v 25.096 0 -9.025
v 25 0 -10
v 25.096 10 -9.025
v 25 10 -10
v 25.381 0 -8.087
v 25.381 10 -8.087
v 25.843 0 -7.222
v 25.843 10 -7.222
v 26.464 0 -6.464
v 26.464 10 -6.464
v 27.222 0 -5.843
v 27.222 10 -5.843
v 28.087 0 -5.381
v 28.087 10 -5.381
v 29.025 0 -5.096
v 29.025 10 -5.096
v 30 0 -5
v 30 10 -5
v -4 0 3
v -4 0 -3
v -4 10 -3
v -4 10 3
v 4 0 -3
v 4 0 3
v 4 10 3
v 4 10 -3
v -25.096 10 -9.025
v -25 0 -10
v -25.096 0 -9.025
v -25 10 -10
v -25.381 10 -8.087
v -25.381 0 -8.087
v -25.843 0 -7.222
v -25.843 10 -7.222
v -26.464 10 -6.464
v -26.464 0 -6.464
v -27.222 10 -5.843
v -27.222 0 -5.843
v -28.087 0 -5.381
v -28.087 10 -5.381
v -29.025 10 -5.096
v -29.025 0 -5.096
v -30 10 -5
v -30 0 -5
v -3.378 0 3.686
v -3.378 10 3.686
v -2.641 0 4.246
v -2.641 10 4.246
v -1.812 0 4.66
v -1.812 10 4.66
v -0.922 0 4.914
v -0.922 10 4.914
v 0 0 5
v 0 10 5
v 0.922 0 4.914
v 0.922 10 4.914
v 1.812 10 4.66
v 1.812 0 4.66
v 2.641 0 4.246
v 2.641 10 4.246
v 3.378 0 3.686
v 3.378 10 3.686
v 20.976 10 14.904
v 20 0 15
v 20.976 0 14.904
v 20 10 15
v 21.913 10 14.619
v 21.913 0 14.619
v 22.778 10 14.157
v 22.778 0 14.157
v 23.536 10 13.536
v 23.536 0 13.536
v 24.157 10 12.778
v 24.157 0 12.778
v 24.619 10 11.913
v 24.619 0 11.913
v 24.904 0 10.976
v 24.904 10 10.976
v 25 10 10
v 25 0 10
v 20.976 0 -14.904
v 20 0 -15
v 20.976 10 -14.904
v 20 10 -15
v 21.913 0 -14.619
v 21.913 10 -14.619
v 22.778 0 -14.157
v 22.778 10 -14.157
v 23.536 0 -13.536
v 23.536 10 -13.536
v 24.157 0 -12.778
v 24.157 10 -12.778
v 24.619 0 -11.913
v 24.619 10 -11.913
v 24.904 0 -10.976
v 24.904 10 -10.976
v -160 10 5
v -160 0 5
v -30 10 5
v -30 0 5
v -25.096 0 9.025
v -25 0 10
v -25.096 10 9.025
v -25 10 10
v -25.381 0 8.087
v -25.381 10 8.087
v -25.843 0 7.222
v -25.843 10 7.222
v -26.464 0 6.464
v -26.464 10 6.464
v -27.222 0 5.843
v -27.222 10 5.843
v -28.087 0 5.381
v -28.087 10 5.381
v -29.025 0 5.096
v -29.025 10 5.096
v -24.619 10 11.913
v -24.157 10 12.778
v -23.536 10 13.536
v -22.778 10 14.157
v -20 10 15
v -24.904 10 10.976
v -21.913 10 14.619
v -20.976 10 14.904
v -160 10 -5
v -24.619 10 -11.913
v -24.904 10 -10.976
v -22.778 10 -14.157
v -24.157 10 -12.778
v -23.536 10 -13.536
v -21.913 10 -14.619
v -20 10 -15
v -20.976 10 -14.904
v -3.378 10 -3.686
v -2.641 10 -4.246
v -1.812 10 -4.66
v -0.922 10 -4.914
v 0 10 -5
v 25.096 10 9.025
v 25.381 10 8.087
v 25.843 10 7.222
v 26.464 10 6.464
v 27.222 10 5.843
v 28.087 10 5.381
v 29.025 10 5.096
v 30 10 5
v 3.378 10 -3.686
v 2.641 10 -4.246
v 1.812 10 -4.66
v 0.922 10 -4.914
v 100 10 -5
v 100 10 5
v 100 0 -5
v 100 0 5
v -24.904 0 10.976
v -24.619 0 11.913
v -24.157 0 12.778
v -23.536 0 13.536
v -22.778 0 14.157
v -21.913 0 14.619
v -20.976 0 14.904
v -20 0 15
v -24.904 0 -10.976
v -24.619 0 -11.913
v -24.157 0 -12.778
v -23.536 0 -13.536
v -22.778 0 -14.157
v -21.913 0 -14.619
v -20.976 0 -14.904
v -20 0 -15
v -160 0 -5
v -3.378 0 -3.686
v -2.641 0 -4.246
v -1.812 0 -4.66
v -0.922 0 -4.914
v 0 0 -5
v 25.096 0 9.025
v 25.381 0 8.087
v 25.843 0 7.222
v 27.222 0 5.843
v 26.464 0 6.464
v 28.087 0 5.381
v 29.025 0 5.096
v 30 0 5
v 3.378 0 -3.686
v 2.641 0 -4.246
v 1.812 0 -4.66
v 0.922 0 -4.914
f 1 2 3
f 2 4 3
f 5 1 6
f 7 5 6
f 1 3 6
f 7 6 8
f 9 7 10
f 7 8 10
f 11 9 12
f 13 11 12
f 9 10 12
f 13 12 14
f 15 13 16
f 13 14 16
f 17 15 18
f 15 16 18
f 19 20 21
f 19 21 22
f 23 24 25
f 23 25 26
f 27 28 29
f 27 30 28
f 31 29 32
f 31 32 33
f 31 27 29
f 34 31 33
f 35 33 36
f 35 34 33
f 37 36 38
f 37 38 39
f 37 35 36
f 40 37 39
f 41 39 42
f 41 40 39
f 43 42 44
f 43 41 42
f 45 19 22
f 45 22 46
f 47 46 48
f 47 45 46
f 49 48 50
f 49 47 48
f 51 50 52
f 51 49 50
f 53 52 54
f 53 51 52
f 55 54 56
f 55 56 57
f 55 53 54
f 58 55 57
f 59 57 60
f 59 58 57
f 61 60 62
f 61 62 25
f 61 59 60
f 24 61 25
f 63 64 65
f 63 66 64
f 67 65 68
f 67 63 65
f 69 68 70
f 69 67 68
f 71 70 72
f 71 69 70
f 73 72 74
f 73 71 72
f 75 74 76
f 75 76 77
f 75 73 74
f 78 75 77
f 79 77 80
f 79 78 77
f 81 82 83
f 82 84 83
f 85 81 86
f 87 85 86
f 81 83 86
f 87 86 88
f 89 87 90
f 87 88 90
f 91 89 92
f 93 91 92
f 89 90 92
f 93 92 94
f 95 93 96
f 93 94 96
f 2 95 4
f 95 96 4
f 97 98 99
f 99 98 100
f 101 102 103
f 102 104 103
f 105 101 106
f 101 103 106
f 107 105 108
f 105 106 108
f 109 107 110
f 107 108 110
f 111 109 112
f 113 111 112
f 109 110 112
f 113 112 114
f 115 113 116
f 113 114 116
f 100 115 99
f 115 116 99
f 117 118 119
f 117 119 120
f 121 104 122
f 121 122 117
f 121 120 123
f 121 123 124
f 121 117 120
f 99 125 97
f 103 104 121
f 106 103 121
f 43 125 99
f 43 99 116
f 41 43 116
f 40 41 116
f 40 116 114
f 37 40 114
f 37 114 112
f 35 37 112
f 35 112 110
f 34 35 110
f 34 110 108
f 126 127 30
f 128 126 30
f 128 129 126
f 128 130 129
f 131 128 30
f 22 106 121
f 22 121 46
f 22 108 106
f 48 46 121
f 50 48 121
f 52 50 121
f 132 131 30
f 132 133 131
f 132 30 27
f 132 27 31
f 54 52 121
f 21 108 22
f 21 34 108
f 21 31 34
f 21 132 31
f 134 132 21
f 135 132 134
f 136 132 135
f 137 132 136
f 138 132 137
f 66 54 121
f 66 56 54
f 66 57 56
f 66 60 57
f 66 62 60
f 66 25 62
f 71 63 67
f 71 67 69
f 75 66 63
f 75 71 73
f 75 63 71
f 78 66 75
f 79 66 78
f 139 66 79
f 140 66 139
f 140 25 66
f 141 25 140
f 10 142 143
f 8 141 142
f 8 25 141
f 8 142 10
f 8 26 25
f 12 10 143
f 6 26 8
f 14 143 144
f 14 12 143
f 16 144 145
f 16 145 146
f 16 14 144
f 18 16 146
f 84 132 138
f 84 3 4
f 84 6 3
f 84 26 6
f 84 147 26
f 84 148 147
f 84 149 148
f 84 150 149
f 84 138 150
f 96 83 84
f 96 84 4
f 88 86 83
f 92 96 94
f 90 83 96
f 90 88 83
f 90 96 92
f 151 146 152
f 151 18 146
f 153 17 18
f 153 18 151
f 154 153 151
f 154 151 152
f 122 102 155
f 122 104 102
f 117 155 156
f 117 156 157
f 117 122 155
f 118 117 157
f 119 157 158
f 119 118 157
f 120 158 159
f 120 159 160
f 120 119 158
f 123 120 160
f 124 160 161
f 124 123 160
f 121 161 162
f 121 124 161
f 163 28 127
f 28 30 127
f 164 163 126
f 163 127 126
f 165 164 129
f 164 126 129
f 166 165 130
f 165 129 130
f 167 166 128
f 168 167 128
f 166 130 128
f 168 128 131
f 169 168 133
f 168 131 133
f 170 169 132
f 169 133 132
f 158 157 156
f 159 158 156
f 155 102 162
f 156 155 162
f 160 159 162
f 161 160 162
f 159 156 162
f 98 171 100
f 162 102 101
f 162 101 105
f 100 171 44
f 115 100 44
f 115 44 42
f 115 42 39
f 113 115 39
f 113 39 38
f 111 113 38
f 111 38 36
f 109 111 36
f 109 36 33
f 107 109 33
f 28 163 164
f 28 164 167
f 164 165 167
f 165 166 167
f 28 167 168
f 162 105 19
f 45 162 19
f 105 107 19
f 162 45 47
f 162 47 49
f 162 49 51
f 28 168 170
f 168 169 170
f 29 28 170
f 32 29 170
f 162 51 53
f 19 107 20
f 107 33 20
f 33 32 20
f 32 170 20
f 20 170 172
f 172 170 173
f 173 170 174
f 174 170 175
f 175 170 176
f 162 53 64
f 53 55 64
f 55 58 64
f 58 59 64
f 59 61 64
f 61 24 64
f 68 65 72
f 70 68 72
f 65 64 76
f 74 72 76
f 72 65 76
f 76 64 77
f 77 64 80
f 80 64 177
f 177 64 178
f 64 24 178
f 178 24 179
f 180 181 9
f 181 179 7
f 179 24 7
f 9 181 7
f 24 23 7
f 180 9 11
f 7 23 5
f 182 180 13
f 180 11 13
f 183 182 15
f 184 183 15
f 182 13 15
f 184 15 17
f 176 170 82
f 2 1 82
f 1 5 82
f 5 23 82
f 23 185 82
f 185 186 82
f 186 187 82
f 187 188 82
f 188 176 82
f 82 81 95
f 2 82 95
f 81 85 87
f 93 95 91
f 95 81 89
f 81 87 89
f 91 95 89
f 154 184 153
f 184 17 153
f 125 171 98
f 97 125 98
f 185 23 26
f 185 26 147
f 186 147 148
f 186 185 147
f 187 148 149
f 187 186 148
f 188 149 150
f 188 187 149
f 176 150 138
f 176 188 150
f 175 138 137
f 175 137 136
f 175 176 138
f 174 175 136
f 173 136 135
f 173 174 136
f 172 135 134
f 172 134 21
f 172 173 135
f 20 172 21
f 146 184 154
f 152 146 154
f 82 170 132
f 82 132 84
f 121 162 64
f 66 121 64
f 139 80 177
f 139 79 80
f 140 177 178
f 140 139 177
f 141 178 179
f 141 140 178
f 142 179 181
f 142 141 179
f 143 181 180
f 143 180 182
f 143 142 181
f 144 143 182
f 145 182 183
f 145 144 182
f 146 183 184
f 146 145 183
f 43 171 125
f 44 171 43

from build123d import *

# Parameters (mm, degrees)
SKETCH1_W           = 50
SKETCH1_H           = 30
BOSS_EXTRUDE1_DEPTH = 10
SKETCH2_W           = 135
SKETCH2_H           = 10
SKETCH2_W_2         = 75
BOSS_EXTRUDE3_DEPTH = 10
FILLET1_R           = 5
FILLET2_R           = 5


with BuildPart() as part:
    # Sketch1 → Boss-Extrude1 (new body)
    with BuildSketch(Plane(origin=(0, 0, 0), x_dir=(1, 0, 0), z_dir=(0, 1, 0))):
        Rectangle(SKETCH1_W, SKETCH1_H)
        with BuildLine():
            Line((-4, 3), (-4, -3))
            ThreePointArc((-4, -3), (0, -5), (4, -3))
            Line((4, -3), (4, 3))
            ThreePointArc((4, 3), (0, 5), (-4, 3))
        make_face(mode=Mode.SUBTRACT)
    extrude(amount=BOSS_EXTRUDE1_DEPTH)

    # Sketch2 → Boss-Extrude3 (add)
    with BuildSketch(Plane.XZ):
        with Locations((-92.5, 0)):
            Rectangle(SKETCH2_W, SKETCH2_H)
        with Locations((62.5, 0)):
            Rectangle(SKETCH2_W_2, SKETCH2_H)
    extrude(amount=-BOSS_EXTRUDE3_DEPTH)

    # Fillet1
    fillet1_edges = [part.edges().sort_by_distance(p)[0] for p in [
        (-25, 5, 5),
        (-25, 5, -5),
        (25, 5, -5),
        (25, 5, 5),
    ]]
    fillet(fillet1_edges, radius=FILLET1_R)

    # Fillet2
    fillet2_edges = [part.edges().sort_by_distance(p)[0] for p in [
        (25, 5, 15),
        (-25, 5, 15),
        (-25, 5, -15),
        (25, 5, -15),
    ]]
    fillet(fillet2_edges, radius=FILLET2_R - 0.0001)  # a hair under: the kernel refuses the full size


solid = part.part
